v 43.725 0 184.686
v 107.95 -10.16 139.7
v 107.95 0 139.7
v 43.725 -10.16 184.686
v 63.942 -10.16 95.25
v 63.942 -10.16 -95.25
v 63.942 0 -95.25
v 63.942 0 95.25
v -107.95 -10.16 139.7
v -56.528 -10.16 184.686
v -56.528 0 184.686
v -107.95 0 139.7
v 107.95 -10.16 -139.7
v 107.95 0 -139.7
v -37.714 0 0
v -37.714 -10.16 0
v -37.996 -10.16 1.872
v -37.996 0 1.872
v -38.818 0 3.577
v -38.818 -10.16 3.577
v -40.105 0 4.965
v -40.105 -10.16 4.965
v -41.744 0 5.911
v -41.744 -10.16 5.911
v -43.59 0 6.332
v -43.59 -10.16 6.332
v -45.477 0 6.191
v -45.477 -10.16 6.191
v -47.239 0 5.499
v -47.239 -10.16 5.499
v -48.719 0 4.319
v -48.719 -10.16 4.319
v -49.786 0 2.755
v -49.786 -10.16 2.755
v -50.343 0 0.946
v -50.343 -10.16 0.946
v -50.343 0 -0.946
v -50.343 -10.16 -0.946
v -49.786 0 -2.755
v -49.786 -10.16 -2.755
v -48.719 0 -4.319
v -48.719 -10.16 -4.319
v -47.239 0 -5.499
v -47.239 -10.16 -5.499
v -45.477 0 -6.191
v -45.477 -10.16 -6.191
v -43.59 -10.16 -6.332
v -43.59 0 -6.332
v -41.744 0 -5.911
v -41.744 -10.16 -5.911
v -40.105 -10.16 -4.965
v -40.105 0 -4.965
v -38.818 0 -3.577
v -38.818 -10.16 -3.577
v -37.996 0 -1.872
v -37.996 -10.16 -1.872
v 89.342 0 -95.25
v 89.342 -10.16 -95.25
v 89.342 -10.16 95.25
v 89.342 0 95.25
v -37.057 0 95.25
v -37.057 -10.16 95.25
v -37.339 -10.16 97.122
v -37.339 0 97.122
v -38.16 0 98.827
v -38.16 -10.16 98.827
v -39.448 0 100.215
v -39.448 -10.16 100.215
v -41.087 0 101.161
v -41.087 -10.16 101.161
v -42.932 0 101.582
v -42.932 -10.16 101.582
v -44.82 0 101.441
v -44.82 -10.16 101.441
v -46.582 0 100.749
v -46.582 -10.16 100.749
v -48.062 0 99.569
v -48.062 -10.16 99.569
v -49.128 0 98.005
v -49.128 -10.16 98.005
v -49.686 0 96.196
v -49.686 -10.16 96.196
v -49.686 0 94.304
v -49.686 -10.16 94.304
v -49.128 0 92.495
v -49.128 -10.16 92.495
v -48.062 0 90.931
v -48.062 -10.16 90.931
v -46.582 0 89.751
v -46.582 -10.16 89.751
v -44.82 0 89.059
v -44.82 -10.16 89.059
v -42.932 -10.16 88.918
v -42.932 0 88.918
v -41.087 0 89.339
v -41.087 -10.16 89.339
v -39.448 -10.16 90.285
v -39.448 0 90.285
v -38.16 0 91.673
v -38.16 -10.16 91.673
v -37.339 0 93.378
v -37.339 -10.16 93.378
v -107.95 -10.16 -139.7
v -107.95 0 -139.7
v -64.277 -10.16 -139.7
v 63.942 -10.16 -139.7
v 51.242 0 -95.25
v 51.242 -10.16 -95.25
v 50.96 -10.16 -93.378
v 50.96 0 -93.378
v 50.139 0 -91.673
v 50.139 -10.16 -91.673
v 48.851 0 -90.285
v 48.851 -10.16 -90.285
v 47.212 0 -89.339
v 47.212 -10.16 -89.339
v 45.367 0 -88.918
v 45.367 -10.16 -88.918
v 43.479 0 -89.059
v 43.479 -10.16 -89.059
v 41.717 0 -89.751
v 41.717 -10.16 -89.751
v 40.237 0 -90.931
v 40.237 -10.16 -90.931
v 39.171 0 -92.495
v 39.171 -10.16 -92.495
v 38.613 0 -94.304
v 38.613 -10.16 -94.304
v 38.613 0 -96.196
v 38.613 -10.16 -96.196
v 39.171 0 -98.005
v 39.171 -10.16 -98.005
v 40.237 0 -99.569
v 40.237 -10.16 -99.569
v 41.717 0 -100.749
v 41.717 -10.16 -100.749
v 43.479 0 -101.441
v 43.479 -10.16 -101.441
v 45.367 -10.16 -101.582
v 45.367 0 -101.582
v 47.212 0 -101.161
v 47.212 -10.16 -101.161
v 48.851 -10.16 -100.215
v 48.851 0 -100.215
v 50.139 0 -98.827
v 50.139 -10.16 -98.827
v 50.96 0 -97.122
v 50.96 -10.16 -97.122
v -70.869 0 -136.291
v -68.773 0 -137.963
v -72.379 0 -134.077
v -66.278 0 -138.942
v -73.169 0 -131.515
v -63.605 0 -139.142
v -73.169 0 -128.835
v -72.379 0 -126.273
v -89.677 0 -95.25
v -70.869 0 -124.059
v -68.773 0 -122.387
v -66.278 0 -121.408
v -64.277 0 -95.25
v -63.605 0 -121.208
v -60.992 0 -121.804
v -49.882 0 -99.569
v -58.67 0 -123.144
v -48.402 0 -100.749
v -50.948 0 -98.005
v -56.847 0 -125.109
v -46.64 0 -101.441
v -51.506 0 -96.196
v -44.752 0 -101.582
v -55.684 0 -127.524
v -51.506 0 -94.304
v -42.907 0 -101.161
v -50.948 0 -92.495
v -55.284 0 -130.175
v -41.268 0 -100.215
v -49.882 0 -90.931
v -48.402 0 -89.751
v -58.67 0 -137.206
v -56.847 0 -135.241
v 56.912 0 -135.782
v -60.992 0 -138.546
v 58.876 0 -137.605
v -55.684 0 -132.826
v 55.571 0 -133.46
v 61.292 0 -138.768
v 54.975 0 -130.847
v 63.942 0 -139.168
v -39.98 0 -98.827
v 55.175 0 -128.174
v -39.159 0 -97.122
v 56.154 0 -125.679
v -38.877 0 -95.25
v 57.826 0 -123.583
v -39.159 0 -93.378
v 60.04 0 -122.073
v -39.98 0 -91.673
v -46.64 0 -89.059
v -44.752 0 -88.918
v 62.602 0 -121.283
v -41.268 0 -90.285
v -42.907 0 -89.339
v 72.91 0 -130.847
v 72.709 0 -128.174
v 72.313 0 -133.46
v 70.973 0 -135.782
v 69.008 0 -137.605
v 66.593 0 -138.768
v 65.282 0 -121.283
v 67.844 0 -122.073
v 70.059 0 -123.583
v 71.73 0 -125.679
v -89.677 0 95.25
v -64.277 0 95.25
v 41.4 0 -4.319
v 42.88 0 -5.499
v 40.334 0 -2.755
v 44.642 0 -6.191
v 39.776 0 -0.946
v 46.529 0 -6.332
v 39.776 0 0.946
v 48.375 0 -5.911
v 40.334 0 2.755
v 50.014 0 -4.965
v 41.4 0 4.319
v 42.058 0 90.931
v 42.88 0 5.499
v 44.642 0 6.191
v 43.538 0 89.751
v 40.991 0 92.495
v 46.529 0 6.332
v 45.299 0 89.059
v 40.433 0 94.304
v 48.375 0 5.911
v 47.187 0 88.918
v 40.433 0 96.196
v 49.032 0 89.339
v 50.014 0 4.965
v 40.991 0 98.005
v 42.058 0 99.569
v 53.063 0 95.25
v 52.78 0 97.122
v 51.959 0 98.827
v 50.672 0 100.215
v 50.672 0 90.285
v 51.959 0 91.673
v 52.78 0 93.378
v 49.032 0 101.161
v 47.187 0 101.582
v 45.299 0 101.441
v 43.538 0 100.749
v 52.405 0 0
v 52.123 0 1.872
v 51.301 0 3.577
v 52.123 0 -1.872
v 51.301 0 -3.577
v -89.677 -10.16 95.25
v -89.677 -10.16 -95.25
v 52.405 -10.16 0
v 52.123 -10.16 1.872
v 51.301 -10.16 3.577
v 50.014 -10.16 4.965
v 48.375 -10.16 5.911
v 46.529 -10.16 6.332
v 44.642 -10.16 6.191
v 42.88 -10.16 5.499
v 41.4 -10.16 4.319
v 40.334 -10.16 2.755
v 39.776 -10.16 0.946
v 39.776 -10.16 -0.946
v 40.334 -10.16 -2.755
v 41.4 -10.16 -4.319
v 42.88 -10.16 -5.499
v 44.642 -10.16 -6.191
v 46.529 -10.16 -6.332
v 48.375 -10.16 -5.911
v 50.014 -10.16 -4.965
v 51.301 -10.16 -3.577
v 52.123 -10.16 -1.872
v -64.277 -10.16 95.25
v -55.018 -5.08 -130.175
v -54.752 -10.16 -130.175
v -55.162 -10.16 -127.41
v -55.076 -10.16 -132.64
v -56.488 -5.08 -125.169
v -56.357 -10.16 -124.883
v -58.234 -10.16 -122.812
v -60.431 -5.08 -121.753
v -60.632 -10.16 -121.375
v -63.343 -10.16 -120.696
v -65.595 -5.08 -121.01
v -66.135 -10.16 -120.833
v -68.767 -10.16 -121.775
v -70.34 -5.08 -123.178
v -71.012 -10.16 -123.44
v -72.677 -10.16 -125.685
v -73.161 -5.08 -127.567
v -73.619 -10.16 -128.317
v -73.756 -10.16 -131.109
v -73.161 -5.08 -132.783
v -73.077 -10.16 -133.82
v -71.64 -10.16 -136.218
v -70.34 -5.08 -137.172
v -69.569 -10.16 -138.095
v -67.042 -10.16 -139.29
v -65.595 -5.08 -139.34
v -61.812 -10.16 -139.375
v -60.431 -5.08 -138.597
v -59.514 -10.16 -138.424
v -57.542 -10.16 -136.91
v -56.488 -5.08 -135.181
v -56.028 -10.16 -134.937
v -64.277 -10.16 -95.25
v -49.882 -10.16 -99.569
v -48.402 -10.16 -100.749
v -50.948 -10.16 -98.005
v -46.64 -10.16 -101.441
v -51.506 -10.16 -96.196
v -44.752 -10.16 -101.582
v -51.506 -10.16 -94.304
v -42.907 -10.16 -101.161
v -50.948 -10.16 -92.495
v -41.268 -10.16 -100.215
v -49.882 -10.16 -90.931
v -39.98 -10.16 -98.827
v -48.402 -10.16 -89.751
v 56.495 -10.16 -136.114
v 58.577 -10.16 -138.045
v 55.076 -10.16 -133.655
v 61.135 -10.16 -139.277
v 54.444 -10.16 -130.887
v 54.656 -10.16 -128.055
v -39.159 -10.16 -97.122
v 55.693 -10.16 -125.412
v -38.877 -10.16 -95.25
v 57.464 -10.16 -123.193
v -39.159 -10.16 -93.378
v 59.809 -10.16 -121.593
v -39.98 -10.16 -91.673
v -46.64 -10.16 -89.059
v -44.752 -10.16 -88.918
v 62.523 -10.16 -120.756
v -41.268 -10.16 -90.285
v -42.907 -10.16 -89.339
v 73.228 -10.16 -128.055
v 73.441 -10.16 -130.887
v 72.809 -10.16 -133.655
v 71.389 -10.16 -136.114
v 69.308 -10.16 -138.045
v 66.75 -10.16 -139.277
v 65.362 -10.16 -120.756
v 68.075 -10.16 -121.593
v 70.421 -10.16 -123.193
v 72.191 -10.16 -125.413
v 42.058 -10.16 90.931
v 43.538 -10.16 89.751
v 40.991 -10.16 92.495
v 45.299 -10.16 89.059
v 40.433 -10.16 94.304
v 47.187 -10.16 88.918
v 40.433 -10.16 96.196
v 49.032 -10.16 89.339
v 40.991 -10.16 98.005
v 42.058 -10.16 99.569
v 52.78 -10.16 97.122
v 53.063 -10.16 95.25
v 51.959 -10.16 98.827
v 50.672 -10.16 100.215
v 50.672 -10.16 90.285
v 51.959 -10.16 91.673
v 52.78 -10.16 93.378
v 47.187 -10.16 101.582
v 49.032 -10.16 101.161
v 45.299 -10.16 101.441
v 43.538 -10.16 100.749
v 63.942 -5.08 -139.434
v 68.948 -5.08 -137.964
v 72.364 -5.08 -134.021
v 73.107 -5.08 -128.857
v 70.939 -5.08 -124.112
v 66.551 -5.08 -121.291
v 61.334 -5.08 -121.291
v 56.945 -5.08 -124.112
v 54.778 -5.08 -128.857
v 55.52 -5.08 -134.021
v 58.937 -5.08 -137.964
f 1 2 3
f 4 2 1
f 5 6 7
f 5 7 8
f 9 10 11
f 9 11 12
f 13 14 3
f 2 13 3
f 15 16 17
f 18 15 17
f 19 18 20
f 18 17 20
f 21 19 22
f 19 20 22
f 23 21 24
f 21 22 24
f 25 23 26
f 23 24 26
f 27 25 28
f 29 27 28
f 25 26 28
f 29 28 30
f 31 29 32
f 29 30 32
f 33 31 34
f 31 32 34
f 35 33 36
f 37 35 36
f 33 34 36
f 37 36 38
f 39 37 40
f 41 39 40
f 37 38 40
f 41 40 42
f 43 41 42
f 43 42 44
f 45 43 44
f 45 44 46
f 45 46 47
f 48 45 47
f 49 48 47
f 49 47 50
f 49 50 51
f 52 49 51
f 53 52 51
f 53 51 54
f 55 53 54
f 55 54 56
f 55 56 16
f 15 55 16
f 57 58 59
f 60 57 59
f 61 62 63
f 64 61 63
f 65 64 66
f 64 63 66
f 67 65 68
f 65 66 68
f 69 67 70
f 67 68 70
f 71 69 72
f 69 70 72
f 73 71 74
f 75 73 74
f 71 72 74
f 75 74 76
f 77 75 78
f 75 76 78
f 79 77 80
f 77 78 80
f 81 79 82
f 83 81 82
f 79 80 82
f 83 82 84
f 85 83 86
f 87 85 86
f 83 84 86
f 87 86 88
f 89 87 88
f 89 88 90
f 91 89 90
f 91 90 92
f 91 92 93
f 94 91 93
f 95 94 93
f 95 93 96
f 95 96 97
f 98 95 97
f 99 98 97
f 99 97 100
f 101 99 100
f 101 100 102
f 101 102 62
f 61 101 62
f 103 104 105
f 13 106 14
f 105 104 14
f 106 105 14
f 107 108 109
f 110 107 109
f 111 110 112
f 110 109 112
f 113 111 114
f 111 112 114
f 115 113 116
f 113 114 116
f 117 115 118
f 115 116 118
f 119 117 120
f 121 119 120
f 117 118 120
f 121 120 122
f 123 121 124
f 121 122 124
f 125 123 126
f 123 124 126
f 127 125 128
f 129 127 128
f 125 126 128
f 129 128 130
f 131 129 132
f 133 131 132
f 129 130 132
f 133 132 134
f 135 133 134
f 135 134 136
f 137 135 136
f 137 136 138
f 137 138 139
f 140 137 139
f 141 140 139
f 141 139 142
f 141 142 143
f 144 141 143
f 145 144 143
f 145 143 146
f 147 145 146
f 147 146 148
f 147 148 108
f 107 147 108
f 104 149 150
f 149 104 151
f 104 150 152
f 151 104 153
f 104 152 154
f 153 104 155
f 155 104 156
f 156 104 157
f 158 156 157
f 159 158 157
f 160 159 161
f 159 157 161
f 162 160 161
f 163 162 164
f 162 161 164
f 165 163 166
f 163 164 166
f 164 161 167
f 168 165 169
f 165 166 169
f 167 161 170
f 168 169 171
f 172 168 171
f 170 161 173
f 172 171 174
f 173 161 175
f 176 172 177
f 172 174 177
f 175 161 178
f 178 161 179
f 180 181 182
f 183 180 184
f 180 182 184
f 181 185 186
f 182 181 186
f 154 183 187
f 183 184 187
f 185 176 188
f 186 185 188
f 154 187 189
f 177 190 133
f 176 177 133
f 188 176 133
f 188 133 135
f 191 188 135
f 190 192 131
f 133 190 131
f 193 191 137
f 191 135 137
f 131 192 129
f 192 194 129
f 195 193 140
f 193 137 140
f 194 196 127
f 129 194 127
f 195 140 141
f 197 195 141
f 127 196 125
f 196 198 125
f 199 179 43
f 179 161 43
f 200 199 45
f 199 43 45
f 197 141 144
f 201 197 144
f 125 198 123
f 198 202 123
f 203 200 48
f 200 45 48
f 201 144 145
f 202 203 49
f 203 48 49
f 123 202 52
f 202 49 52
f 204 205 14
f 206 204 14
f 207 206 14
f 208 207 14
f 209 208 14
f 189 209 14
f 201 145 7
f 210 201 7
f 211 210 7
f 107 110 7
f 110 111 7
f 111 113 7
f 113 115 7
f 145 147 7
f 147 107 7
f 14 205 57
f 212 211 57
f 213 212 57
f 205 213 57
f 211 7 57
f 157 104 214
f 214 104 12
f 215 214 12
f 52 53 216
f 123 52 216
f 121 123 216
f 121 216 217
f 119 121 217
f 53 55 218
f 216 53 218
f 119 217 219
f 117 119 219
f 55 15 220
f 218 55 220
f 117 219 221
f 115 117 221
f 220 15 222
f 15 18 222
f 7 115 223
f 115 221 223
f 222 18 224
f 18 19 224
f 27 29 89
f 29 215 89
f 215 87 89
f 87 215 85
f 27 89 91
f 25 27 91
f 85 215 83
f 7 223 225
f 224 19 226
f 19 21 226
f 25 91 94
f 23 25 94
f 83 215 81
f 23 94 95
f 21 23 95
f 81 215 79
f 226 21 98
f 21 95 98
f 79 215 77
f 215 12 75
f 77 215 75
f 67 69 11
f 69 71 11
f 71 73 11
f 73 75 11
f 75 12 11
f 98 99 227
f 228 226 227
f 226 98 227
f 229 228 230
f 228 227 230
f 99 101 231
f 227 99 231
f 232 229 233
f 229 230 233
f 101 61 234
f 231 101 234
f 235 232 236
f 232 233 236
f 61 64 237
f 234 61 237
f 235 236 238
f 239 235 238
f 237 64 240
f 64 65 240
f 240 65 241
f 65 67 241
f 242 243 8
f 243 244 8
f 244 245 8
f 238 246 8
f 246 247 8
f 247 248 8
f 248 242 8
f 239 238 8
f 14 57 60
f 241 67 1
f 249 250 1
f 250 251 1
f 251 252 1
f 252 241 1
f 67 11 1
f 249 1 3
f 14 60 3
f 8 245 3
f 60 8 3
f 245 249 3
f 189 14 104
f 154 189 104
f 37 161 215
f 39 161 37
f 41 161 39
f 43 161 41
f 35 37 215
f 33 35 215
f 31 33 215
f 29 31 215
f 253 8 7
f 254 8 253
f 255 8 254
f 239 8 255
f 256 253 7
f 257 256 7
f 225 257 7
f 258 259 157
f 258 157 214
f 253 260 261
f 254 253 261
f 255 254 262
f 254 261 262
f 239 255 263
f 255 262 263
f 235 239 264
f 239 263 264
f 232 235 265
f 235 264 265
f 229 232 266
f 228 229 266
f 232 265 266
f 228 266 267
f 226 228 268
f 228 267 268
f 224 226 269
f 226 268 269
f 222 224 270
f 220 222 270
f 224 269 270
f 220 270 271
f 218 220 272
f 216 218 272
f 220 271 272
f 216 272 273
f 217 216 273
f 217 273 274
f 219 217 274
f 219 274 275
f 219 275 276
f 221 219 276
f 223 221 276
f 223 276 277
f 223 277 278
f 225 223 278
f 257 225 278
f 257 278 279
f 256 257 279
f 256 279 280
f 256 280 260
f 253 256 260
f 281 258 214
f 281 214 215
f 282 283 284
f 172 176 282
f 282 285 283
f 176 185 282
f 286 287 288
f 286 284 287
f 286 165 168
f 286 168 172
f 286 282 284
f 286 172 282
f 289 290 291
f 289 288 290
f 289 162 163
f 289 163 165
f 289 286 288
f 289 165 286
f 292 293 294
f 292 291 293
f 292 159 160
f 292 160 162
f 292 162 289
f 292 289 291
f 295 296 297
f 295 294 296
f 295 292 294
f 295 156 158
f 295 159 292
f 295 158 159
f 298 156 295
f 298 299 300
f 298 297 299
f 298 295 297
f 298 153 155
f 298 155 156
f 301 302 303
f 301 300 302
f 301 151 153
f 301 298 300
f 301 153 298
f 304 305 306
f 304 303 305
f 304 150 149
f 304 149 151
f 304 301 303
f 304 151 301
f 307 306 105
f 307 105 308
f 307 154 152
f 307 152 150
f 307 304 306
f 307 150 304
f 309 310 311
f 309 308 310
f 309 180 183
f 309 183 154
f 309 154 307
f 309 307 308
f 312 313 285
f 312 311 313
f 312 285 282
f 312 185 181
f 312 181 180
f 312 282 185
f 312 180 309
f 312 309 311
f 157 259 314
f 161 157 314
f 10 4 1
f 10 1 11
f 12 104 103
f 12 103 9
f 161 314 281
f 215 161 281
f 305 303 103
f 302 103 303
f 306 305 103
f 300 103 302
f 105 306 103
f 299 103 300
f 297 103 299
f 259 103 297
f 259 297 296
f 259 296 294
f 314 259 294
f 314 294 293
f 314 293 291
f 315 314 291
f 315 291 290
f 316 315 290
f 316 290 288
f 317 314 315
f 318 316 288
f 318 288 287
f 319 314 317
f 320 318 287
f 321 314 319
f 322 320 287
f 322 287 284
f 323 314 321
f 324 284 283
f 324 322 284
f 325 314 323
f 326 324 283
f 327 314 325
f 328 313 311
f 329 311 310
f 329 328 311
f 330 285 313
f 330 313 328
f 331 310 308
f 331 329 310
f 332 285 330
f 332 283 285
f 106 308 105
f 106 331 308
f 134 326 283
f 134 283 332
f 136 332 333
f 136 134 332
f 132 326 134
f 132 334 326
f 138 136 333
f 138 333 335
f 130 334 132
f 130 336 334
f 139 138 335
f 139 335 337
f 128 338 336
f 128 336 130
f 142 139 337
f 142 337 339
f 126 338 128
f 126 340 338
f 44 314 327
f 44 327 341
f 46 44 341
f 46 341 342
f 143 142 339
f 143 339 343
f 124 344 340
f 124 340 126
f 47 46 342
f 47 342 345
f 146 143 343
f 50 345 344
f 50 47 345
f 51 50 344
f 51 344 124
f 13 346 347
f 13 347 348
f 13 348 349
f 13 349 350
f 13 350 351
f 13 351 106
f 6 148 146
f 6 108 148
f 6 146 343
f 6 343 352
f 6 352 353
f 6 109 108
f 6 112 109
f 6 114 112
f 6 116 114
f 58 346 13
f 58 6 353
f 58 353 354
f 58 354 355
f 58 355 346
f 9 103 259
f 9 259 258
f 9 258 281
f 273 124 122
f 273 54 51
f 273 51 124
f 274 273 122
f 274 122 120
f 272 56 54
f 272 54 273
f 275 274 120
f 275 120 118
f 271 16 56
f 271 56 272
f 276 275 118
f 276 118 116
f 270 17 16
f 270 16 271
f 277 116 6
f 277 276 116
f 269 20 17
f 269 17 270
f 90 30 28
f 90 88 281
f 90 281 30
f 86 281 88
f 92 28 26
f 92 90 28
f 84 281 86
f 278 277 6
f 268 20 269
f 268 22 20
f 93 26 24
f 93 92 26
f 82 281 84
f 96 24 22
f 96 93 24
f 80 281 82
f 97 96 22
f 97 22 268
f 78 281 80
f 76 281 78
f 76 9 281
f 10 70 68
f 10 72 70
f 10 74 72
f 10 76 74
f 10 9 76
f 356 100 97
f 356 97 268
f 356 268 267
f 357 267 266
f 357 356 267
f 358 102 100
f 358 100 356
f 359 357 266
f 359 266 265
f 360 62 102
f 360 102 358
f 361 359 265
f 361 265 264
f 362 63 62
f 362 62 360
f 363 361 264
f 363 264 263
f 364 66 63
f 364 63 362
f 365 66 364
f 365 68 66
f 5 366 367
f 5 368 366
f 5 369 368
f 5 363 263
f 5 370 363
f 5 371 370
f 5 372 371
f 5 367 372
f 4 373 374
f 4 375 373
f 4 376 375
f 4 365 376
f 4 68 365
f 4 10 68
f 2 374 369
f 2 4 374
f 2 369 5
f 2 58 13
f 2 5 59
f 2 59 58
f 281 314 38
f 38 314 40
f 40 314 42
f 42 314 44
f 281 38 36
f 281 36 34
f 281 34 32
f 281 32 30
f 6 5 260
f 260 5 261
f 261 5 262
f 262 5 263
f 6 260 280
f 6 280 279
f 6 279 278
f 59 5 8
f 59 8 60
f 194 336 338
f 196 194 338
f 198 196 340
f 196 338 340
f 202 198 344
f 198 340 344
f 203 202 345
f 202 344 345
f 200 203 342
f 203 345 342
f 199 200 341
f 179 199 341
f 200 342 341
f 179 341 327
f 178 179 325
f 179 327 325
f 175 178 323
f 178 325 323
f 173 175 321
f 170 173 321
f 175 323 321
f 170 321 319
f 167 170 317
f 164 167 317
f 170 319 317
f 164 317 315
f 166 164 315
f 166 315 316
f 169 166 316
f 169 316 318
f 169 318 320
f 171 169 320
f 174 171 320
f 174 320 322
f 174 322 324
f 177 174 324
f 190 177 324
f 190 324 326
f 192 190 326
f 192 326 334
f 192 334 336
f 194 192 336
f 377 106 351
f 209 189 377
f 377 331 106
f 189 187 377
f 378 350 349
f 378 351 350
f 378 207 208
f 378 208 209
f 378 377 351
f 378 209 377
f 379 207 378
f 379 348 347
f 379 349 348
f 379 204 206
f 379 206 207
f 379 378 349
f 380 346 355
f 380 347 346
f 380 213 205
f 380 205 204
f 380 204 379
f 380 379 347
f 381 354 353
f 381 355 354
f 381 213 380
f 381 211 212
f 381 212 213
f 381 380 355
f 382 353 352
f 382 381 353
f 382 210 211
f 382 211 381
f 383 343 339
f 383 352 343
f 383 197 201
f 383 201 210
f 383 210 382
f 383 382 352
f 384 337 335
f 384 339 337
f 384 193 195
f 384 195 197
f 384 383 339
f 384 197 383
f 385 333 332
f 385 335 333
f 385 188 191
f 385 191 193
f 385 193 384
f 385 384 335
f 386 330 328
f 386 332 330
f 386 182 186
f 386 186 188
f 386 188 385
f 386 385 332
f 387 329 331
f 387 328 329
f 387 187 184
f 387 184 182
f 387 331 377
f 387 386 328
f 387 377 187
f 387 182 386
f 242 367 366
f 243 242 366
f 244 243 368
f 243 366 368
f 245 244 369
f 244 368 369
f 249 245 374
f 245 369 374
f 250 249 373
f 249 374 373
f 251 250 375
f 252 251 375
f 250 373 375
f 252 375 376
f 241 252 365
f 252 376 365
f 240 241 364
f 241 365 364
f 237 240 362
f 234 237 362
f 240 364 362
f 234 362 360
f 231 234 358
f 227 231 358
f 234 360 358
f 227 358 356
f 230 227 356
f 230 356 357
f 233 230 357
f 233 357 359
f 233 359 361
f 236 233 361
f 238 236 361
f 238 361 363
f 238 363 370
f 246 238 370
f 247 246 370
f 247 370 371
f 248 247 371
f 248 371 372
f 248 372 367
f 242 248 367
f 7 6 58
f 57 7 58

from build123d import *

# Parameters (mm, degrees)
F0_W     = 215.9
F0_H     = 279.4
F1_DEPTH = 10.16
F3_DEPTH = 10.16
F4_W     = 25.4
F4_H     = 190.5
F5_DEPTH = 25.4
F6_R     = 6.35
F7_DEPTH = 25.4
F9_DEPTH = 25.4
F9_TAPER = 3


with BuildPart() as f1:
    # F0 (on Front) → F1 (new body)
    with BuildSketch(Plane.XZ):
        Rectangle(F0_W, F0_H)
    extrude(amount=F1_DEPTH)

    # F2 (on face) → F3 (join)
    with BuildSketch(Plane.XZ.offset(10.16)):
        Polygon((-56.5280616283, 184.6861541271), (-107.95, 139.7), (107.95, 139.7), (43.724745512, 184.6861541271), align=None)
    extrude(amount=-F3_DEPTH)

    # F4 (on face) → F5 (cut)
    with BuildSketch(Plane.XZ.offset(10.16)):
        with Locations((-76.9769162781, 0)):
            Rectangle(F4_W, F4_H)
        with Locations((76.6421729739, 0)):
            Rectangle(F4_W, F4_H)
    extrude(amount=-F5_DEPTH, mode=Mode.SUBTRACT)

    # F6 (on face) → F7 (cut)
    with BuildSketch(Plane.XZ.offset(10.16)):
        with Locations((-43.4066951275, 95.25)):
            Circle(F6_R)
        with Locations((-44.0643727779, 0)):
            Circle(F6_R)
        with Locations((-45.2269162781, -95.25)):
            Circle(F6_R)
        with Locations((46.7125048725, 95.25)):
            Circle(F6_R)
        with Locations((46.0548272221, 0)):
            Circle(F6_R)
        with Locations((44.8922837219, -95.25)):
            Circle(F6_R)
    extrude(amount=-F7_DEPTH, mode=Mode.SUBTRACT)

    # F8 (on face) → F9 (cut)
    with BuildSketch(Plane.XZ.offset(10.16)):
        with BuildLine():
            ThreePointArc((-64.2769162781, -139.7), (-57.5417241873, -136.9101920908), (-54.7519162781, -130.175))
            ThreePointArc((-54.7519162781, -130.175), (-71.0121083689, -123.4398079092), (-64.2769162781, -139.7))
        make_face()
        with BuildLine():
            ThreePointArc((73.4671729739, -130.175), (57.2069809313, -123.439807861), (63.9421728375, -139.7))
            ThreePointArc((63.9421728375, -139.7), (70.6773650165, -136.910192139), (73.4671729739, -130.175))
        make_face()
    extrude(amount=-F9_DEPTH, taper=F9_TAPER, mode=Mode.SUBTRACT)


solid = f1.part
